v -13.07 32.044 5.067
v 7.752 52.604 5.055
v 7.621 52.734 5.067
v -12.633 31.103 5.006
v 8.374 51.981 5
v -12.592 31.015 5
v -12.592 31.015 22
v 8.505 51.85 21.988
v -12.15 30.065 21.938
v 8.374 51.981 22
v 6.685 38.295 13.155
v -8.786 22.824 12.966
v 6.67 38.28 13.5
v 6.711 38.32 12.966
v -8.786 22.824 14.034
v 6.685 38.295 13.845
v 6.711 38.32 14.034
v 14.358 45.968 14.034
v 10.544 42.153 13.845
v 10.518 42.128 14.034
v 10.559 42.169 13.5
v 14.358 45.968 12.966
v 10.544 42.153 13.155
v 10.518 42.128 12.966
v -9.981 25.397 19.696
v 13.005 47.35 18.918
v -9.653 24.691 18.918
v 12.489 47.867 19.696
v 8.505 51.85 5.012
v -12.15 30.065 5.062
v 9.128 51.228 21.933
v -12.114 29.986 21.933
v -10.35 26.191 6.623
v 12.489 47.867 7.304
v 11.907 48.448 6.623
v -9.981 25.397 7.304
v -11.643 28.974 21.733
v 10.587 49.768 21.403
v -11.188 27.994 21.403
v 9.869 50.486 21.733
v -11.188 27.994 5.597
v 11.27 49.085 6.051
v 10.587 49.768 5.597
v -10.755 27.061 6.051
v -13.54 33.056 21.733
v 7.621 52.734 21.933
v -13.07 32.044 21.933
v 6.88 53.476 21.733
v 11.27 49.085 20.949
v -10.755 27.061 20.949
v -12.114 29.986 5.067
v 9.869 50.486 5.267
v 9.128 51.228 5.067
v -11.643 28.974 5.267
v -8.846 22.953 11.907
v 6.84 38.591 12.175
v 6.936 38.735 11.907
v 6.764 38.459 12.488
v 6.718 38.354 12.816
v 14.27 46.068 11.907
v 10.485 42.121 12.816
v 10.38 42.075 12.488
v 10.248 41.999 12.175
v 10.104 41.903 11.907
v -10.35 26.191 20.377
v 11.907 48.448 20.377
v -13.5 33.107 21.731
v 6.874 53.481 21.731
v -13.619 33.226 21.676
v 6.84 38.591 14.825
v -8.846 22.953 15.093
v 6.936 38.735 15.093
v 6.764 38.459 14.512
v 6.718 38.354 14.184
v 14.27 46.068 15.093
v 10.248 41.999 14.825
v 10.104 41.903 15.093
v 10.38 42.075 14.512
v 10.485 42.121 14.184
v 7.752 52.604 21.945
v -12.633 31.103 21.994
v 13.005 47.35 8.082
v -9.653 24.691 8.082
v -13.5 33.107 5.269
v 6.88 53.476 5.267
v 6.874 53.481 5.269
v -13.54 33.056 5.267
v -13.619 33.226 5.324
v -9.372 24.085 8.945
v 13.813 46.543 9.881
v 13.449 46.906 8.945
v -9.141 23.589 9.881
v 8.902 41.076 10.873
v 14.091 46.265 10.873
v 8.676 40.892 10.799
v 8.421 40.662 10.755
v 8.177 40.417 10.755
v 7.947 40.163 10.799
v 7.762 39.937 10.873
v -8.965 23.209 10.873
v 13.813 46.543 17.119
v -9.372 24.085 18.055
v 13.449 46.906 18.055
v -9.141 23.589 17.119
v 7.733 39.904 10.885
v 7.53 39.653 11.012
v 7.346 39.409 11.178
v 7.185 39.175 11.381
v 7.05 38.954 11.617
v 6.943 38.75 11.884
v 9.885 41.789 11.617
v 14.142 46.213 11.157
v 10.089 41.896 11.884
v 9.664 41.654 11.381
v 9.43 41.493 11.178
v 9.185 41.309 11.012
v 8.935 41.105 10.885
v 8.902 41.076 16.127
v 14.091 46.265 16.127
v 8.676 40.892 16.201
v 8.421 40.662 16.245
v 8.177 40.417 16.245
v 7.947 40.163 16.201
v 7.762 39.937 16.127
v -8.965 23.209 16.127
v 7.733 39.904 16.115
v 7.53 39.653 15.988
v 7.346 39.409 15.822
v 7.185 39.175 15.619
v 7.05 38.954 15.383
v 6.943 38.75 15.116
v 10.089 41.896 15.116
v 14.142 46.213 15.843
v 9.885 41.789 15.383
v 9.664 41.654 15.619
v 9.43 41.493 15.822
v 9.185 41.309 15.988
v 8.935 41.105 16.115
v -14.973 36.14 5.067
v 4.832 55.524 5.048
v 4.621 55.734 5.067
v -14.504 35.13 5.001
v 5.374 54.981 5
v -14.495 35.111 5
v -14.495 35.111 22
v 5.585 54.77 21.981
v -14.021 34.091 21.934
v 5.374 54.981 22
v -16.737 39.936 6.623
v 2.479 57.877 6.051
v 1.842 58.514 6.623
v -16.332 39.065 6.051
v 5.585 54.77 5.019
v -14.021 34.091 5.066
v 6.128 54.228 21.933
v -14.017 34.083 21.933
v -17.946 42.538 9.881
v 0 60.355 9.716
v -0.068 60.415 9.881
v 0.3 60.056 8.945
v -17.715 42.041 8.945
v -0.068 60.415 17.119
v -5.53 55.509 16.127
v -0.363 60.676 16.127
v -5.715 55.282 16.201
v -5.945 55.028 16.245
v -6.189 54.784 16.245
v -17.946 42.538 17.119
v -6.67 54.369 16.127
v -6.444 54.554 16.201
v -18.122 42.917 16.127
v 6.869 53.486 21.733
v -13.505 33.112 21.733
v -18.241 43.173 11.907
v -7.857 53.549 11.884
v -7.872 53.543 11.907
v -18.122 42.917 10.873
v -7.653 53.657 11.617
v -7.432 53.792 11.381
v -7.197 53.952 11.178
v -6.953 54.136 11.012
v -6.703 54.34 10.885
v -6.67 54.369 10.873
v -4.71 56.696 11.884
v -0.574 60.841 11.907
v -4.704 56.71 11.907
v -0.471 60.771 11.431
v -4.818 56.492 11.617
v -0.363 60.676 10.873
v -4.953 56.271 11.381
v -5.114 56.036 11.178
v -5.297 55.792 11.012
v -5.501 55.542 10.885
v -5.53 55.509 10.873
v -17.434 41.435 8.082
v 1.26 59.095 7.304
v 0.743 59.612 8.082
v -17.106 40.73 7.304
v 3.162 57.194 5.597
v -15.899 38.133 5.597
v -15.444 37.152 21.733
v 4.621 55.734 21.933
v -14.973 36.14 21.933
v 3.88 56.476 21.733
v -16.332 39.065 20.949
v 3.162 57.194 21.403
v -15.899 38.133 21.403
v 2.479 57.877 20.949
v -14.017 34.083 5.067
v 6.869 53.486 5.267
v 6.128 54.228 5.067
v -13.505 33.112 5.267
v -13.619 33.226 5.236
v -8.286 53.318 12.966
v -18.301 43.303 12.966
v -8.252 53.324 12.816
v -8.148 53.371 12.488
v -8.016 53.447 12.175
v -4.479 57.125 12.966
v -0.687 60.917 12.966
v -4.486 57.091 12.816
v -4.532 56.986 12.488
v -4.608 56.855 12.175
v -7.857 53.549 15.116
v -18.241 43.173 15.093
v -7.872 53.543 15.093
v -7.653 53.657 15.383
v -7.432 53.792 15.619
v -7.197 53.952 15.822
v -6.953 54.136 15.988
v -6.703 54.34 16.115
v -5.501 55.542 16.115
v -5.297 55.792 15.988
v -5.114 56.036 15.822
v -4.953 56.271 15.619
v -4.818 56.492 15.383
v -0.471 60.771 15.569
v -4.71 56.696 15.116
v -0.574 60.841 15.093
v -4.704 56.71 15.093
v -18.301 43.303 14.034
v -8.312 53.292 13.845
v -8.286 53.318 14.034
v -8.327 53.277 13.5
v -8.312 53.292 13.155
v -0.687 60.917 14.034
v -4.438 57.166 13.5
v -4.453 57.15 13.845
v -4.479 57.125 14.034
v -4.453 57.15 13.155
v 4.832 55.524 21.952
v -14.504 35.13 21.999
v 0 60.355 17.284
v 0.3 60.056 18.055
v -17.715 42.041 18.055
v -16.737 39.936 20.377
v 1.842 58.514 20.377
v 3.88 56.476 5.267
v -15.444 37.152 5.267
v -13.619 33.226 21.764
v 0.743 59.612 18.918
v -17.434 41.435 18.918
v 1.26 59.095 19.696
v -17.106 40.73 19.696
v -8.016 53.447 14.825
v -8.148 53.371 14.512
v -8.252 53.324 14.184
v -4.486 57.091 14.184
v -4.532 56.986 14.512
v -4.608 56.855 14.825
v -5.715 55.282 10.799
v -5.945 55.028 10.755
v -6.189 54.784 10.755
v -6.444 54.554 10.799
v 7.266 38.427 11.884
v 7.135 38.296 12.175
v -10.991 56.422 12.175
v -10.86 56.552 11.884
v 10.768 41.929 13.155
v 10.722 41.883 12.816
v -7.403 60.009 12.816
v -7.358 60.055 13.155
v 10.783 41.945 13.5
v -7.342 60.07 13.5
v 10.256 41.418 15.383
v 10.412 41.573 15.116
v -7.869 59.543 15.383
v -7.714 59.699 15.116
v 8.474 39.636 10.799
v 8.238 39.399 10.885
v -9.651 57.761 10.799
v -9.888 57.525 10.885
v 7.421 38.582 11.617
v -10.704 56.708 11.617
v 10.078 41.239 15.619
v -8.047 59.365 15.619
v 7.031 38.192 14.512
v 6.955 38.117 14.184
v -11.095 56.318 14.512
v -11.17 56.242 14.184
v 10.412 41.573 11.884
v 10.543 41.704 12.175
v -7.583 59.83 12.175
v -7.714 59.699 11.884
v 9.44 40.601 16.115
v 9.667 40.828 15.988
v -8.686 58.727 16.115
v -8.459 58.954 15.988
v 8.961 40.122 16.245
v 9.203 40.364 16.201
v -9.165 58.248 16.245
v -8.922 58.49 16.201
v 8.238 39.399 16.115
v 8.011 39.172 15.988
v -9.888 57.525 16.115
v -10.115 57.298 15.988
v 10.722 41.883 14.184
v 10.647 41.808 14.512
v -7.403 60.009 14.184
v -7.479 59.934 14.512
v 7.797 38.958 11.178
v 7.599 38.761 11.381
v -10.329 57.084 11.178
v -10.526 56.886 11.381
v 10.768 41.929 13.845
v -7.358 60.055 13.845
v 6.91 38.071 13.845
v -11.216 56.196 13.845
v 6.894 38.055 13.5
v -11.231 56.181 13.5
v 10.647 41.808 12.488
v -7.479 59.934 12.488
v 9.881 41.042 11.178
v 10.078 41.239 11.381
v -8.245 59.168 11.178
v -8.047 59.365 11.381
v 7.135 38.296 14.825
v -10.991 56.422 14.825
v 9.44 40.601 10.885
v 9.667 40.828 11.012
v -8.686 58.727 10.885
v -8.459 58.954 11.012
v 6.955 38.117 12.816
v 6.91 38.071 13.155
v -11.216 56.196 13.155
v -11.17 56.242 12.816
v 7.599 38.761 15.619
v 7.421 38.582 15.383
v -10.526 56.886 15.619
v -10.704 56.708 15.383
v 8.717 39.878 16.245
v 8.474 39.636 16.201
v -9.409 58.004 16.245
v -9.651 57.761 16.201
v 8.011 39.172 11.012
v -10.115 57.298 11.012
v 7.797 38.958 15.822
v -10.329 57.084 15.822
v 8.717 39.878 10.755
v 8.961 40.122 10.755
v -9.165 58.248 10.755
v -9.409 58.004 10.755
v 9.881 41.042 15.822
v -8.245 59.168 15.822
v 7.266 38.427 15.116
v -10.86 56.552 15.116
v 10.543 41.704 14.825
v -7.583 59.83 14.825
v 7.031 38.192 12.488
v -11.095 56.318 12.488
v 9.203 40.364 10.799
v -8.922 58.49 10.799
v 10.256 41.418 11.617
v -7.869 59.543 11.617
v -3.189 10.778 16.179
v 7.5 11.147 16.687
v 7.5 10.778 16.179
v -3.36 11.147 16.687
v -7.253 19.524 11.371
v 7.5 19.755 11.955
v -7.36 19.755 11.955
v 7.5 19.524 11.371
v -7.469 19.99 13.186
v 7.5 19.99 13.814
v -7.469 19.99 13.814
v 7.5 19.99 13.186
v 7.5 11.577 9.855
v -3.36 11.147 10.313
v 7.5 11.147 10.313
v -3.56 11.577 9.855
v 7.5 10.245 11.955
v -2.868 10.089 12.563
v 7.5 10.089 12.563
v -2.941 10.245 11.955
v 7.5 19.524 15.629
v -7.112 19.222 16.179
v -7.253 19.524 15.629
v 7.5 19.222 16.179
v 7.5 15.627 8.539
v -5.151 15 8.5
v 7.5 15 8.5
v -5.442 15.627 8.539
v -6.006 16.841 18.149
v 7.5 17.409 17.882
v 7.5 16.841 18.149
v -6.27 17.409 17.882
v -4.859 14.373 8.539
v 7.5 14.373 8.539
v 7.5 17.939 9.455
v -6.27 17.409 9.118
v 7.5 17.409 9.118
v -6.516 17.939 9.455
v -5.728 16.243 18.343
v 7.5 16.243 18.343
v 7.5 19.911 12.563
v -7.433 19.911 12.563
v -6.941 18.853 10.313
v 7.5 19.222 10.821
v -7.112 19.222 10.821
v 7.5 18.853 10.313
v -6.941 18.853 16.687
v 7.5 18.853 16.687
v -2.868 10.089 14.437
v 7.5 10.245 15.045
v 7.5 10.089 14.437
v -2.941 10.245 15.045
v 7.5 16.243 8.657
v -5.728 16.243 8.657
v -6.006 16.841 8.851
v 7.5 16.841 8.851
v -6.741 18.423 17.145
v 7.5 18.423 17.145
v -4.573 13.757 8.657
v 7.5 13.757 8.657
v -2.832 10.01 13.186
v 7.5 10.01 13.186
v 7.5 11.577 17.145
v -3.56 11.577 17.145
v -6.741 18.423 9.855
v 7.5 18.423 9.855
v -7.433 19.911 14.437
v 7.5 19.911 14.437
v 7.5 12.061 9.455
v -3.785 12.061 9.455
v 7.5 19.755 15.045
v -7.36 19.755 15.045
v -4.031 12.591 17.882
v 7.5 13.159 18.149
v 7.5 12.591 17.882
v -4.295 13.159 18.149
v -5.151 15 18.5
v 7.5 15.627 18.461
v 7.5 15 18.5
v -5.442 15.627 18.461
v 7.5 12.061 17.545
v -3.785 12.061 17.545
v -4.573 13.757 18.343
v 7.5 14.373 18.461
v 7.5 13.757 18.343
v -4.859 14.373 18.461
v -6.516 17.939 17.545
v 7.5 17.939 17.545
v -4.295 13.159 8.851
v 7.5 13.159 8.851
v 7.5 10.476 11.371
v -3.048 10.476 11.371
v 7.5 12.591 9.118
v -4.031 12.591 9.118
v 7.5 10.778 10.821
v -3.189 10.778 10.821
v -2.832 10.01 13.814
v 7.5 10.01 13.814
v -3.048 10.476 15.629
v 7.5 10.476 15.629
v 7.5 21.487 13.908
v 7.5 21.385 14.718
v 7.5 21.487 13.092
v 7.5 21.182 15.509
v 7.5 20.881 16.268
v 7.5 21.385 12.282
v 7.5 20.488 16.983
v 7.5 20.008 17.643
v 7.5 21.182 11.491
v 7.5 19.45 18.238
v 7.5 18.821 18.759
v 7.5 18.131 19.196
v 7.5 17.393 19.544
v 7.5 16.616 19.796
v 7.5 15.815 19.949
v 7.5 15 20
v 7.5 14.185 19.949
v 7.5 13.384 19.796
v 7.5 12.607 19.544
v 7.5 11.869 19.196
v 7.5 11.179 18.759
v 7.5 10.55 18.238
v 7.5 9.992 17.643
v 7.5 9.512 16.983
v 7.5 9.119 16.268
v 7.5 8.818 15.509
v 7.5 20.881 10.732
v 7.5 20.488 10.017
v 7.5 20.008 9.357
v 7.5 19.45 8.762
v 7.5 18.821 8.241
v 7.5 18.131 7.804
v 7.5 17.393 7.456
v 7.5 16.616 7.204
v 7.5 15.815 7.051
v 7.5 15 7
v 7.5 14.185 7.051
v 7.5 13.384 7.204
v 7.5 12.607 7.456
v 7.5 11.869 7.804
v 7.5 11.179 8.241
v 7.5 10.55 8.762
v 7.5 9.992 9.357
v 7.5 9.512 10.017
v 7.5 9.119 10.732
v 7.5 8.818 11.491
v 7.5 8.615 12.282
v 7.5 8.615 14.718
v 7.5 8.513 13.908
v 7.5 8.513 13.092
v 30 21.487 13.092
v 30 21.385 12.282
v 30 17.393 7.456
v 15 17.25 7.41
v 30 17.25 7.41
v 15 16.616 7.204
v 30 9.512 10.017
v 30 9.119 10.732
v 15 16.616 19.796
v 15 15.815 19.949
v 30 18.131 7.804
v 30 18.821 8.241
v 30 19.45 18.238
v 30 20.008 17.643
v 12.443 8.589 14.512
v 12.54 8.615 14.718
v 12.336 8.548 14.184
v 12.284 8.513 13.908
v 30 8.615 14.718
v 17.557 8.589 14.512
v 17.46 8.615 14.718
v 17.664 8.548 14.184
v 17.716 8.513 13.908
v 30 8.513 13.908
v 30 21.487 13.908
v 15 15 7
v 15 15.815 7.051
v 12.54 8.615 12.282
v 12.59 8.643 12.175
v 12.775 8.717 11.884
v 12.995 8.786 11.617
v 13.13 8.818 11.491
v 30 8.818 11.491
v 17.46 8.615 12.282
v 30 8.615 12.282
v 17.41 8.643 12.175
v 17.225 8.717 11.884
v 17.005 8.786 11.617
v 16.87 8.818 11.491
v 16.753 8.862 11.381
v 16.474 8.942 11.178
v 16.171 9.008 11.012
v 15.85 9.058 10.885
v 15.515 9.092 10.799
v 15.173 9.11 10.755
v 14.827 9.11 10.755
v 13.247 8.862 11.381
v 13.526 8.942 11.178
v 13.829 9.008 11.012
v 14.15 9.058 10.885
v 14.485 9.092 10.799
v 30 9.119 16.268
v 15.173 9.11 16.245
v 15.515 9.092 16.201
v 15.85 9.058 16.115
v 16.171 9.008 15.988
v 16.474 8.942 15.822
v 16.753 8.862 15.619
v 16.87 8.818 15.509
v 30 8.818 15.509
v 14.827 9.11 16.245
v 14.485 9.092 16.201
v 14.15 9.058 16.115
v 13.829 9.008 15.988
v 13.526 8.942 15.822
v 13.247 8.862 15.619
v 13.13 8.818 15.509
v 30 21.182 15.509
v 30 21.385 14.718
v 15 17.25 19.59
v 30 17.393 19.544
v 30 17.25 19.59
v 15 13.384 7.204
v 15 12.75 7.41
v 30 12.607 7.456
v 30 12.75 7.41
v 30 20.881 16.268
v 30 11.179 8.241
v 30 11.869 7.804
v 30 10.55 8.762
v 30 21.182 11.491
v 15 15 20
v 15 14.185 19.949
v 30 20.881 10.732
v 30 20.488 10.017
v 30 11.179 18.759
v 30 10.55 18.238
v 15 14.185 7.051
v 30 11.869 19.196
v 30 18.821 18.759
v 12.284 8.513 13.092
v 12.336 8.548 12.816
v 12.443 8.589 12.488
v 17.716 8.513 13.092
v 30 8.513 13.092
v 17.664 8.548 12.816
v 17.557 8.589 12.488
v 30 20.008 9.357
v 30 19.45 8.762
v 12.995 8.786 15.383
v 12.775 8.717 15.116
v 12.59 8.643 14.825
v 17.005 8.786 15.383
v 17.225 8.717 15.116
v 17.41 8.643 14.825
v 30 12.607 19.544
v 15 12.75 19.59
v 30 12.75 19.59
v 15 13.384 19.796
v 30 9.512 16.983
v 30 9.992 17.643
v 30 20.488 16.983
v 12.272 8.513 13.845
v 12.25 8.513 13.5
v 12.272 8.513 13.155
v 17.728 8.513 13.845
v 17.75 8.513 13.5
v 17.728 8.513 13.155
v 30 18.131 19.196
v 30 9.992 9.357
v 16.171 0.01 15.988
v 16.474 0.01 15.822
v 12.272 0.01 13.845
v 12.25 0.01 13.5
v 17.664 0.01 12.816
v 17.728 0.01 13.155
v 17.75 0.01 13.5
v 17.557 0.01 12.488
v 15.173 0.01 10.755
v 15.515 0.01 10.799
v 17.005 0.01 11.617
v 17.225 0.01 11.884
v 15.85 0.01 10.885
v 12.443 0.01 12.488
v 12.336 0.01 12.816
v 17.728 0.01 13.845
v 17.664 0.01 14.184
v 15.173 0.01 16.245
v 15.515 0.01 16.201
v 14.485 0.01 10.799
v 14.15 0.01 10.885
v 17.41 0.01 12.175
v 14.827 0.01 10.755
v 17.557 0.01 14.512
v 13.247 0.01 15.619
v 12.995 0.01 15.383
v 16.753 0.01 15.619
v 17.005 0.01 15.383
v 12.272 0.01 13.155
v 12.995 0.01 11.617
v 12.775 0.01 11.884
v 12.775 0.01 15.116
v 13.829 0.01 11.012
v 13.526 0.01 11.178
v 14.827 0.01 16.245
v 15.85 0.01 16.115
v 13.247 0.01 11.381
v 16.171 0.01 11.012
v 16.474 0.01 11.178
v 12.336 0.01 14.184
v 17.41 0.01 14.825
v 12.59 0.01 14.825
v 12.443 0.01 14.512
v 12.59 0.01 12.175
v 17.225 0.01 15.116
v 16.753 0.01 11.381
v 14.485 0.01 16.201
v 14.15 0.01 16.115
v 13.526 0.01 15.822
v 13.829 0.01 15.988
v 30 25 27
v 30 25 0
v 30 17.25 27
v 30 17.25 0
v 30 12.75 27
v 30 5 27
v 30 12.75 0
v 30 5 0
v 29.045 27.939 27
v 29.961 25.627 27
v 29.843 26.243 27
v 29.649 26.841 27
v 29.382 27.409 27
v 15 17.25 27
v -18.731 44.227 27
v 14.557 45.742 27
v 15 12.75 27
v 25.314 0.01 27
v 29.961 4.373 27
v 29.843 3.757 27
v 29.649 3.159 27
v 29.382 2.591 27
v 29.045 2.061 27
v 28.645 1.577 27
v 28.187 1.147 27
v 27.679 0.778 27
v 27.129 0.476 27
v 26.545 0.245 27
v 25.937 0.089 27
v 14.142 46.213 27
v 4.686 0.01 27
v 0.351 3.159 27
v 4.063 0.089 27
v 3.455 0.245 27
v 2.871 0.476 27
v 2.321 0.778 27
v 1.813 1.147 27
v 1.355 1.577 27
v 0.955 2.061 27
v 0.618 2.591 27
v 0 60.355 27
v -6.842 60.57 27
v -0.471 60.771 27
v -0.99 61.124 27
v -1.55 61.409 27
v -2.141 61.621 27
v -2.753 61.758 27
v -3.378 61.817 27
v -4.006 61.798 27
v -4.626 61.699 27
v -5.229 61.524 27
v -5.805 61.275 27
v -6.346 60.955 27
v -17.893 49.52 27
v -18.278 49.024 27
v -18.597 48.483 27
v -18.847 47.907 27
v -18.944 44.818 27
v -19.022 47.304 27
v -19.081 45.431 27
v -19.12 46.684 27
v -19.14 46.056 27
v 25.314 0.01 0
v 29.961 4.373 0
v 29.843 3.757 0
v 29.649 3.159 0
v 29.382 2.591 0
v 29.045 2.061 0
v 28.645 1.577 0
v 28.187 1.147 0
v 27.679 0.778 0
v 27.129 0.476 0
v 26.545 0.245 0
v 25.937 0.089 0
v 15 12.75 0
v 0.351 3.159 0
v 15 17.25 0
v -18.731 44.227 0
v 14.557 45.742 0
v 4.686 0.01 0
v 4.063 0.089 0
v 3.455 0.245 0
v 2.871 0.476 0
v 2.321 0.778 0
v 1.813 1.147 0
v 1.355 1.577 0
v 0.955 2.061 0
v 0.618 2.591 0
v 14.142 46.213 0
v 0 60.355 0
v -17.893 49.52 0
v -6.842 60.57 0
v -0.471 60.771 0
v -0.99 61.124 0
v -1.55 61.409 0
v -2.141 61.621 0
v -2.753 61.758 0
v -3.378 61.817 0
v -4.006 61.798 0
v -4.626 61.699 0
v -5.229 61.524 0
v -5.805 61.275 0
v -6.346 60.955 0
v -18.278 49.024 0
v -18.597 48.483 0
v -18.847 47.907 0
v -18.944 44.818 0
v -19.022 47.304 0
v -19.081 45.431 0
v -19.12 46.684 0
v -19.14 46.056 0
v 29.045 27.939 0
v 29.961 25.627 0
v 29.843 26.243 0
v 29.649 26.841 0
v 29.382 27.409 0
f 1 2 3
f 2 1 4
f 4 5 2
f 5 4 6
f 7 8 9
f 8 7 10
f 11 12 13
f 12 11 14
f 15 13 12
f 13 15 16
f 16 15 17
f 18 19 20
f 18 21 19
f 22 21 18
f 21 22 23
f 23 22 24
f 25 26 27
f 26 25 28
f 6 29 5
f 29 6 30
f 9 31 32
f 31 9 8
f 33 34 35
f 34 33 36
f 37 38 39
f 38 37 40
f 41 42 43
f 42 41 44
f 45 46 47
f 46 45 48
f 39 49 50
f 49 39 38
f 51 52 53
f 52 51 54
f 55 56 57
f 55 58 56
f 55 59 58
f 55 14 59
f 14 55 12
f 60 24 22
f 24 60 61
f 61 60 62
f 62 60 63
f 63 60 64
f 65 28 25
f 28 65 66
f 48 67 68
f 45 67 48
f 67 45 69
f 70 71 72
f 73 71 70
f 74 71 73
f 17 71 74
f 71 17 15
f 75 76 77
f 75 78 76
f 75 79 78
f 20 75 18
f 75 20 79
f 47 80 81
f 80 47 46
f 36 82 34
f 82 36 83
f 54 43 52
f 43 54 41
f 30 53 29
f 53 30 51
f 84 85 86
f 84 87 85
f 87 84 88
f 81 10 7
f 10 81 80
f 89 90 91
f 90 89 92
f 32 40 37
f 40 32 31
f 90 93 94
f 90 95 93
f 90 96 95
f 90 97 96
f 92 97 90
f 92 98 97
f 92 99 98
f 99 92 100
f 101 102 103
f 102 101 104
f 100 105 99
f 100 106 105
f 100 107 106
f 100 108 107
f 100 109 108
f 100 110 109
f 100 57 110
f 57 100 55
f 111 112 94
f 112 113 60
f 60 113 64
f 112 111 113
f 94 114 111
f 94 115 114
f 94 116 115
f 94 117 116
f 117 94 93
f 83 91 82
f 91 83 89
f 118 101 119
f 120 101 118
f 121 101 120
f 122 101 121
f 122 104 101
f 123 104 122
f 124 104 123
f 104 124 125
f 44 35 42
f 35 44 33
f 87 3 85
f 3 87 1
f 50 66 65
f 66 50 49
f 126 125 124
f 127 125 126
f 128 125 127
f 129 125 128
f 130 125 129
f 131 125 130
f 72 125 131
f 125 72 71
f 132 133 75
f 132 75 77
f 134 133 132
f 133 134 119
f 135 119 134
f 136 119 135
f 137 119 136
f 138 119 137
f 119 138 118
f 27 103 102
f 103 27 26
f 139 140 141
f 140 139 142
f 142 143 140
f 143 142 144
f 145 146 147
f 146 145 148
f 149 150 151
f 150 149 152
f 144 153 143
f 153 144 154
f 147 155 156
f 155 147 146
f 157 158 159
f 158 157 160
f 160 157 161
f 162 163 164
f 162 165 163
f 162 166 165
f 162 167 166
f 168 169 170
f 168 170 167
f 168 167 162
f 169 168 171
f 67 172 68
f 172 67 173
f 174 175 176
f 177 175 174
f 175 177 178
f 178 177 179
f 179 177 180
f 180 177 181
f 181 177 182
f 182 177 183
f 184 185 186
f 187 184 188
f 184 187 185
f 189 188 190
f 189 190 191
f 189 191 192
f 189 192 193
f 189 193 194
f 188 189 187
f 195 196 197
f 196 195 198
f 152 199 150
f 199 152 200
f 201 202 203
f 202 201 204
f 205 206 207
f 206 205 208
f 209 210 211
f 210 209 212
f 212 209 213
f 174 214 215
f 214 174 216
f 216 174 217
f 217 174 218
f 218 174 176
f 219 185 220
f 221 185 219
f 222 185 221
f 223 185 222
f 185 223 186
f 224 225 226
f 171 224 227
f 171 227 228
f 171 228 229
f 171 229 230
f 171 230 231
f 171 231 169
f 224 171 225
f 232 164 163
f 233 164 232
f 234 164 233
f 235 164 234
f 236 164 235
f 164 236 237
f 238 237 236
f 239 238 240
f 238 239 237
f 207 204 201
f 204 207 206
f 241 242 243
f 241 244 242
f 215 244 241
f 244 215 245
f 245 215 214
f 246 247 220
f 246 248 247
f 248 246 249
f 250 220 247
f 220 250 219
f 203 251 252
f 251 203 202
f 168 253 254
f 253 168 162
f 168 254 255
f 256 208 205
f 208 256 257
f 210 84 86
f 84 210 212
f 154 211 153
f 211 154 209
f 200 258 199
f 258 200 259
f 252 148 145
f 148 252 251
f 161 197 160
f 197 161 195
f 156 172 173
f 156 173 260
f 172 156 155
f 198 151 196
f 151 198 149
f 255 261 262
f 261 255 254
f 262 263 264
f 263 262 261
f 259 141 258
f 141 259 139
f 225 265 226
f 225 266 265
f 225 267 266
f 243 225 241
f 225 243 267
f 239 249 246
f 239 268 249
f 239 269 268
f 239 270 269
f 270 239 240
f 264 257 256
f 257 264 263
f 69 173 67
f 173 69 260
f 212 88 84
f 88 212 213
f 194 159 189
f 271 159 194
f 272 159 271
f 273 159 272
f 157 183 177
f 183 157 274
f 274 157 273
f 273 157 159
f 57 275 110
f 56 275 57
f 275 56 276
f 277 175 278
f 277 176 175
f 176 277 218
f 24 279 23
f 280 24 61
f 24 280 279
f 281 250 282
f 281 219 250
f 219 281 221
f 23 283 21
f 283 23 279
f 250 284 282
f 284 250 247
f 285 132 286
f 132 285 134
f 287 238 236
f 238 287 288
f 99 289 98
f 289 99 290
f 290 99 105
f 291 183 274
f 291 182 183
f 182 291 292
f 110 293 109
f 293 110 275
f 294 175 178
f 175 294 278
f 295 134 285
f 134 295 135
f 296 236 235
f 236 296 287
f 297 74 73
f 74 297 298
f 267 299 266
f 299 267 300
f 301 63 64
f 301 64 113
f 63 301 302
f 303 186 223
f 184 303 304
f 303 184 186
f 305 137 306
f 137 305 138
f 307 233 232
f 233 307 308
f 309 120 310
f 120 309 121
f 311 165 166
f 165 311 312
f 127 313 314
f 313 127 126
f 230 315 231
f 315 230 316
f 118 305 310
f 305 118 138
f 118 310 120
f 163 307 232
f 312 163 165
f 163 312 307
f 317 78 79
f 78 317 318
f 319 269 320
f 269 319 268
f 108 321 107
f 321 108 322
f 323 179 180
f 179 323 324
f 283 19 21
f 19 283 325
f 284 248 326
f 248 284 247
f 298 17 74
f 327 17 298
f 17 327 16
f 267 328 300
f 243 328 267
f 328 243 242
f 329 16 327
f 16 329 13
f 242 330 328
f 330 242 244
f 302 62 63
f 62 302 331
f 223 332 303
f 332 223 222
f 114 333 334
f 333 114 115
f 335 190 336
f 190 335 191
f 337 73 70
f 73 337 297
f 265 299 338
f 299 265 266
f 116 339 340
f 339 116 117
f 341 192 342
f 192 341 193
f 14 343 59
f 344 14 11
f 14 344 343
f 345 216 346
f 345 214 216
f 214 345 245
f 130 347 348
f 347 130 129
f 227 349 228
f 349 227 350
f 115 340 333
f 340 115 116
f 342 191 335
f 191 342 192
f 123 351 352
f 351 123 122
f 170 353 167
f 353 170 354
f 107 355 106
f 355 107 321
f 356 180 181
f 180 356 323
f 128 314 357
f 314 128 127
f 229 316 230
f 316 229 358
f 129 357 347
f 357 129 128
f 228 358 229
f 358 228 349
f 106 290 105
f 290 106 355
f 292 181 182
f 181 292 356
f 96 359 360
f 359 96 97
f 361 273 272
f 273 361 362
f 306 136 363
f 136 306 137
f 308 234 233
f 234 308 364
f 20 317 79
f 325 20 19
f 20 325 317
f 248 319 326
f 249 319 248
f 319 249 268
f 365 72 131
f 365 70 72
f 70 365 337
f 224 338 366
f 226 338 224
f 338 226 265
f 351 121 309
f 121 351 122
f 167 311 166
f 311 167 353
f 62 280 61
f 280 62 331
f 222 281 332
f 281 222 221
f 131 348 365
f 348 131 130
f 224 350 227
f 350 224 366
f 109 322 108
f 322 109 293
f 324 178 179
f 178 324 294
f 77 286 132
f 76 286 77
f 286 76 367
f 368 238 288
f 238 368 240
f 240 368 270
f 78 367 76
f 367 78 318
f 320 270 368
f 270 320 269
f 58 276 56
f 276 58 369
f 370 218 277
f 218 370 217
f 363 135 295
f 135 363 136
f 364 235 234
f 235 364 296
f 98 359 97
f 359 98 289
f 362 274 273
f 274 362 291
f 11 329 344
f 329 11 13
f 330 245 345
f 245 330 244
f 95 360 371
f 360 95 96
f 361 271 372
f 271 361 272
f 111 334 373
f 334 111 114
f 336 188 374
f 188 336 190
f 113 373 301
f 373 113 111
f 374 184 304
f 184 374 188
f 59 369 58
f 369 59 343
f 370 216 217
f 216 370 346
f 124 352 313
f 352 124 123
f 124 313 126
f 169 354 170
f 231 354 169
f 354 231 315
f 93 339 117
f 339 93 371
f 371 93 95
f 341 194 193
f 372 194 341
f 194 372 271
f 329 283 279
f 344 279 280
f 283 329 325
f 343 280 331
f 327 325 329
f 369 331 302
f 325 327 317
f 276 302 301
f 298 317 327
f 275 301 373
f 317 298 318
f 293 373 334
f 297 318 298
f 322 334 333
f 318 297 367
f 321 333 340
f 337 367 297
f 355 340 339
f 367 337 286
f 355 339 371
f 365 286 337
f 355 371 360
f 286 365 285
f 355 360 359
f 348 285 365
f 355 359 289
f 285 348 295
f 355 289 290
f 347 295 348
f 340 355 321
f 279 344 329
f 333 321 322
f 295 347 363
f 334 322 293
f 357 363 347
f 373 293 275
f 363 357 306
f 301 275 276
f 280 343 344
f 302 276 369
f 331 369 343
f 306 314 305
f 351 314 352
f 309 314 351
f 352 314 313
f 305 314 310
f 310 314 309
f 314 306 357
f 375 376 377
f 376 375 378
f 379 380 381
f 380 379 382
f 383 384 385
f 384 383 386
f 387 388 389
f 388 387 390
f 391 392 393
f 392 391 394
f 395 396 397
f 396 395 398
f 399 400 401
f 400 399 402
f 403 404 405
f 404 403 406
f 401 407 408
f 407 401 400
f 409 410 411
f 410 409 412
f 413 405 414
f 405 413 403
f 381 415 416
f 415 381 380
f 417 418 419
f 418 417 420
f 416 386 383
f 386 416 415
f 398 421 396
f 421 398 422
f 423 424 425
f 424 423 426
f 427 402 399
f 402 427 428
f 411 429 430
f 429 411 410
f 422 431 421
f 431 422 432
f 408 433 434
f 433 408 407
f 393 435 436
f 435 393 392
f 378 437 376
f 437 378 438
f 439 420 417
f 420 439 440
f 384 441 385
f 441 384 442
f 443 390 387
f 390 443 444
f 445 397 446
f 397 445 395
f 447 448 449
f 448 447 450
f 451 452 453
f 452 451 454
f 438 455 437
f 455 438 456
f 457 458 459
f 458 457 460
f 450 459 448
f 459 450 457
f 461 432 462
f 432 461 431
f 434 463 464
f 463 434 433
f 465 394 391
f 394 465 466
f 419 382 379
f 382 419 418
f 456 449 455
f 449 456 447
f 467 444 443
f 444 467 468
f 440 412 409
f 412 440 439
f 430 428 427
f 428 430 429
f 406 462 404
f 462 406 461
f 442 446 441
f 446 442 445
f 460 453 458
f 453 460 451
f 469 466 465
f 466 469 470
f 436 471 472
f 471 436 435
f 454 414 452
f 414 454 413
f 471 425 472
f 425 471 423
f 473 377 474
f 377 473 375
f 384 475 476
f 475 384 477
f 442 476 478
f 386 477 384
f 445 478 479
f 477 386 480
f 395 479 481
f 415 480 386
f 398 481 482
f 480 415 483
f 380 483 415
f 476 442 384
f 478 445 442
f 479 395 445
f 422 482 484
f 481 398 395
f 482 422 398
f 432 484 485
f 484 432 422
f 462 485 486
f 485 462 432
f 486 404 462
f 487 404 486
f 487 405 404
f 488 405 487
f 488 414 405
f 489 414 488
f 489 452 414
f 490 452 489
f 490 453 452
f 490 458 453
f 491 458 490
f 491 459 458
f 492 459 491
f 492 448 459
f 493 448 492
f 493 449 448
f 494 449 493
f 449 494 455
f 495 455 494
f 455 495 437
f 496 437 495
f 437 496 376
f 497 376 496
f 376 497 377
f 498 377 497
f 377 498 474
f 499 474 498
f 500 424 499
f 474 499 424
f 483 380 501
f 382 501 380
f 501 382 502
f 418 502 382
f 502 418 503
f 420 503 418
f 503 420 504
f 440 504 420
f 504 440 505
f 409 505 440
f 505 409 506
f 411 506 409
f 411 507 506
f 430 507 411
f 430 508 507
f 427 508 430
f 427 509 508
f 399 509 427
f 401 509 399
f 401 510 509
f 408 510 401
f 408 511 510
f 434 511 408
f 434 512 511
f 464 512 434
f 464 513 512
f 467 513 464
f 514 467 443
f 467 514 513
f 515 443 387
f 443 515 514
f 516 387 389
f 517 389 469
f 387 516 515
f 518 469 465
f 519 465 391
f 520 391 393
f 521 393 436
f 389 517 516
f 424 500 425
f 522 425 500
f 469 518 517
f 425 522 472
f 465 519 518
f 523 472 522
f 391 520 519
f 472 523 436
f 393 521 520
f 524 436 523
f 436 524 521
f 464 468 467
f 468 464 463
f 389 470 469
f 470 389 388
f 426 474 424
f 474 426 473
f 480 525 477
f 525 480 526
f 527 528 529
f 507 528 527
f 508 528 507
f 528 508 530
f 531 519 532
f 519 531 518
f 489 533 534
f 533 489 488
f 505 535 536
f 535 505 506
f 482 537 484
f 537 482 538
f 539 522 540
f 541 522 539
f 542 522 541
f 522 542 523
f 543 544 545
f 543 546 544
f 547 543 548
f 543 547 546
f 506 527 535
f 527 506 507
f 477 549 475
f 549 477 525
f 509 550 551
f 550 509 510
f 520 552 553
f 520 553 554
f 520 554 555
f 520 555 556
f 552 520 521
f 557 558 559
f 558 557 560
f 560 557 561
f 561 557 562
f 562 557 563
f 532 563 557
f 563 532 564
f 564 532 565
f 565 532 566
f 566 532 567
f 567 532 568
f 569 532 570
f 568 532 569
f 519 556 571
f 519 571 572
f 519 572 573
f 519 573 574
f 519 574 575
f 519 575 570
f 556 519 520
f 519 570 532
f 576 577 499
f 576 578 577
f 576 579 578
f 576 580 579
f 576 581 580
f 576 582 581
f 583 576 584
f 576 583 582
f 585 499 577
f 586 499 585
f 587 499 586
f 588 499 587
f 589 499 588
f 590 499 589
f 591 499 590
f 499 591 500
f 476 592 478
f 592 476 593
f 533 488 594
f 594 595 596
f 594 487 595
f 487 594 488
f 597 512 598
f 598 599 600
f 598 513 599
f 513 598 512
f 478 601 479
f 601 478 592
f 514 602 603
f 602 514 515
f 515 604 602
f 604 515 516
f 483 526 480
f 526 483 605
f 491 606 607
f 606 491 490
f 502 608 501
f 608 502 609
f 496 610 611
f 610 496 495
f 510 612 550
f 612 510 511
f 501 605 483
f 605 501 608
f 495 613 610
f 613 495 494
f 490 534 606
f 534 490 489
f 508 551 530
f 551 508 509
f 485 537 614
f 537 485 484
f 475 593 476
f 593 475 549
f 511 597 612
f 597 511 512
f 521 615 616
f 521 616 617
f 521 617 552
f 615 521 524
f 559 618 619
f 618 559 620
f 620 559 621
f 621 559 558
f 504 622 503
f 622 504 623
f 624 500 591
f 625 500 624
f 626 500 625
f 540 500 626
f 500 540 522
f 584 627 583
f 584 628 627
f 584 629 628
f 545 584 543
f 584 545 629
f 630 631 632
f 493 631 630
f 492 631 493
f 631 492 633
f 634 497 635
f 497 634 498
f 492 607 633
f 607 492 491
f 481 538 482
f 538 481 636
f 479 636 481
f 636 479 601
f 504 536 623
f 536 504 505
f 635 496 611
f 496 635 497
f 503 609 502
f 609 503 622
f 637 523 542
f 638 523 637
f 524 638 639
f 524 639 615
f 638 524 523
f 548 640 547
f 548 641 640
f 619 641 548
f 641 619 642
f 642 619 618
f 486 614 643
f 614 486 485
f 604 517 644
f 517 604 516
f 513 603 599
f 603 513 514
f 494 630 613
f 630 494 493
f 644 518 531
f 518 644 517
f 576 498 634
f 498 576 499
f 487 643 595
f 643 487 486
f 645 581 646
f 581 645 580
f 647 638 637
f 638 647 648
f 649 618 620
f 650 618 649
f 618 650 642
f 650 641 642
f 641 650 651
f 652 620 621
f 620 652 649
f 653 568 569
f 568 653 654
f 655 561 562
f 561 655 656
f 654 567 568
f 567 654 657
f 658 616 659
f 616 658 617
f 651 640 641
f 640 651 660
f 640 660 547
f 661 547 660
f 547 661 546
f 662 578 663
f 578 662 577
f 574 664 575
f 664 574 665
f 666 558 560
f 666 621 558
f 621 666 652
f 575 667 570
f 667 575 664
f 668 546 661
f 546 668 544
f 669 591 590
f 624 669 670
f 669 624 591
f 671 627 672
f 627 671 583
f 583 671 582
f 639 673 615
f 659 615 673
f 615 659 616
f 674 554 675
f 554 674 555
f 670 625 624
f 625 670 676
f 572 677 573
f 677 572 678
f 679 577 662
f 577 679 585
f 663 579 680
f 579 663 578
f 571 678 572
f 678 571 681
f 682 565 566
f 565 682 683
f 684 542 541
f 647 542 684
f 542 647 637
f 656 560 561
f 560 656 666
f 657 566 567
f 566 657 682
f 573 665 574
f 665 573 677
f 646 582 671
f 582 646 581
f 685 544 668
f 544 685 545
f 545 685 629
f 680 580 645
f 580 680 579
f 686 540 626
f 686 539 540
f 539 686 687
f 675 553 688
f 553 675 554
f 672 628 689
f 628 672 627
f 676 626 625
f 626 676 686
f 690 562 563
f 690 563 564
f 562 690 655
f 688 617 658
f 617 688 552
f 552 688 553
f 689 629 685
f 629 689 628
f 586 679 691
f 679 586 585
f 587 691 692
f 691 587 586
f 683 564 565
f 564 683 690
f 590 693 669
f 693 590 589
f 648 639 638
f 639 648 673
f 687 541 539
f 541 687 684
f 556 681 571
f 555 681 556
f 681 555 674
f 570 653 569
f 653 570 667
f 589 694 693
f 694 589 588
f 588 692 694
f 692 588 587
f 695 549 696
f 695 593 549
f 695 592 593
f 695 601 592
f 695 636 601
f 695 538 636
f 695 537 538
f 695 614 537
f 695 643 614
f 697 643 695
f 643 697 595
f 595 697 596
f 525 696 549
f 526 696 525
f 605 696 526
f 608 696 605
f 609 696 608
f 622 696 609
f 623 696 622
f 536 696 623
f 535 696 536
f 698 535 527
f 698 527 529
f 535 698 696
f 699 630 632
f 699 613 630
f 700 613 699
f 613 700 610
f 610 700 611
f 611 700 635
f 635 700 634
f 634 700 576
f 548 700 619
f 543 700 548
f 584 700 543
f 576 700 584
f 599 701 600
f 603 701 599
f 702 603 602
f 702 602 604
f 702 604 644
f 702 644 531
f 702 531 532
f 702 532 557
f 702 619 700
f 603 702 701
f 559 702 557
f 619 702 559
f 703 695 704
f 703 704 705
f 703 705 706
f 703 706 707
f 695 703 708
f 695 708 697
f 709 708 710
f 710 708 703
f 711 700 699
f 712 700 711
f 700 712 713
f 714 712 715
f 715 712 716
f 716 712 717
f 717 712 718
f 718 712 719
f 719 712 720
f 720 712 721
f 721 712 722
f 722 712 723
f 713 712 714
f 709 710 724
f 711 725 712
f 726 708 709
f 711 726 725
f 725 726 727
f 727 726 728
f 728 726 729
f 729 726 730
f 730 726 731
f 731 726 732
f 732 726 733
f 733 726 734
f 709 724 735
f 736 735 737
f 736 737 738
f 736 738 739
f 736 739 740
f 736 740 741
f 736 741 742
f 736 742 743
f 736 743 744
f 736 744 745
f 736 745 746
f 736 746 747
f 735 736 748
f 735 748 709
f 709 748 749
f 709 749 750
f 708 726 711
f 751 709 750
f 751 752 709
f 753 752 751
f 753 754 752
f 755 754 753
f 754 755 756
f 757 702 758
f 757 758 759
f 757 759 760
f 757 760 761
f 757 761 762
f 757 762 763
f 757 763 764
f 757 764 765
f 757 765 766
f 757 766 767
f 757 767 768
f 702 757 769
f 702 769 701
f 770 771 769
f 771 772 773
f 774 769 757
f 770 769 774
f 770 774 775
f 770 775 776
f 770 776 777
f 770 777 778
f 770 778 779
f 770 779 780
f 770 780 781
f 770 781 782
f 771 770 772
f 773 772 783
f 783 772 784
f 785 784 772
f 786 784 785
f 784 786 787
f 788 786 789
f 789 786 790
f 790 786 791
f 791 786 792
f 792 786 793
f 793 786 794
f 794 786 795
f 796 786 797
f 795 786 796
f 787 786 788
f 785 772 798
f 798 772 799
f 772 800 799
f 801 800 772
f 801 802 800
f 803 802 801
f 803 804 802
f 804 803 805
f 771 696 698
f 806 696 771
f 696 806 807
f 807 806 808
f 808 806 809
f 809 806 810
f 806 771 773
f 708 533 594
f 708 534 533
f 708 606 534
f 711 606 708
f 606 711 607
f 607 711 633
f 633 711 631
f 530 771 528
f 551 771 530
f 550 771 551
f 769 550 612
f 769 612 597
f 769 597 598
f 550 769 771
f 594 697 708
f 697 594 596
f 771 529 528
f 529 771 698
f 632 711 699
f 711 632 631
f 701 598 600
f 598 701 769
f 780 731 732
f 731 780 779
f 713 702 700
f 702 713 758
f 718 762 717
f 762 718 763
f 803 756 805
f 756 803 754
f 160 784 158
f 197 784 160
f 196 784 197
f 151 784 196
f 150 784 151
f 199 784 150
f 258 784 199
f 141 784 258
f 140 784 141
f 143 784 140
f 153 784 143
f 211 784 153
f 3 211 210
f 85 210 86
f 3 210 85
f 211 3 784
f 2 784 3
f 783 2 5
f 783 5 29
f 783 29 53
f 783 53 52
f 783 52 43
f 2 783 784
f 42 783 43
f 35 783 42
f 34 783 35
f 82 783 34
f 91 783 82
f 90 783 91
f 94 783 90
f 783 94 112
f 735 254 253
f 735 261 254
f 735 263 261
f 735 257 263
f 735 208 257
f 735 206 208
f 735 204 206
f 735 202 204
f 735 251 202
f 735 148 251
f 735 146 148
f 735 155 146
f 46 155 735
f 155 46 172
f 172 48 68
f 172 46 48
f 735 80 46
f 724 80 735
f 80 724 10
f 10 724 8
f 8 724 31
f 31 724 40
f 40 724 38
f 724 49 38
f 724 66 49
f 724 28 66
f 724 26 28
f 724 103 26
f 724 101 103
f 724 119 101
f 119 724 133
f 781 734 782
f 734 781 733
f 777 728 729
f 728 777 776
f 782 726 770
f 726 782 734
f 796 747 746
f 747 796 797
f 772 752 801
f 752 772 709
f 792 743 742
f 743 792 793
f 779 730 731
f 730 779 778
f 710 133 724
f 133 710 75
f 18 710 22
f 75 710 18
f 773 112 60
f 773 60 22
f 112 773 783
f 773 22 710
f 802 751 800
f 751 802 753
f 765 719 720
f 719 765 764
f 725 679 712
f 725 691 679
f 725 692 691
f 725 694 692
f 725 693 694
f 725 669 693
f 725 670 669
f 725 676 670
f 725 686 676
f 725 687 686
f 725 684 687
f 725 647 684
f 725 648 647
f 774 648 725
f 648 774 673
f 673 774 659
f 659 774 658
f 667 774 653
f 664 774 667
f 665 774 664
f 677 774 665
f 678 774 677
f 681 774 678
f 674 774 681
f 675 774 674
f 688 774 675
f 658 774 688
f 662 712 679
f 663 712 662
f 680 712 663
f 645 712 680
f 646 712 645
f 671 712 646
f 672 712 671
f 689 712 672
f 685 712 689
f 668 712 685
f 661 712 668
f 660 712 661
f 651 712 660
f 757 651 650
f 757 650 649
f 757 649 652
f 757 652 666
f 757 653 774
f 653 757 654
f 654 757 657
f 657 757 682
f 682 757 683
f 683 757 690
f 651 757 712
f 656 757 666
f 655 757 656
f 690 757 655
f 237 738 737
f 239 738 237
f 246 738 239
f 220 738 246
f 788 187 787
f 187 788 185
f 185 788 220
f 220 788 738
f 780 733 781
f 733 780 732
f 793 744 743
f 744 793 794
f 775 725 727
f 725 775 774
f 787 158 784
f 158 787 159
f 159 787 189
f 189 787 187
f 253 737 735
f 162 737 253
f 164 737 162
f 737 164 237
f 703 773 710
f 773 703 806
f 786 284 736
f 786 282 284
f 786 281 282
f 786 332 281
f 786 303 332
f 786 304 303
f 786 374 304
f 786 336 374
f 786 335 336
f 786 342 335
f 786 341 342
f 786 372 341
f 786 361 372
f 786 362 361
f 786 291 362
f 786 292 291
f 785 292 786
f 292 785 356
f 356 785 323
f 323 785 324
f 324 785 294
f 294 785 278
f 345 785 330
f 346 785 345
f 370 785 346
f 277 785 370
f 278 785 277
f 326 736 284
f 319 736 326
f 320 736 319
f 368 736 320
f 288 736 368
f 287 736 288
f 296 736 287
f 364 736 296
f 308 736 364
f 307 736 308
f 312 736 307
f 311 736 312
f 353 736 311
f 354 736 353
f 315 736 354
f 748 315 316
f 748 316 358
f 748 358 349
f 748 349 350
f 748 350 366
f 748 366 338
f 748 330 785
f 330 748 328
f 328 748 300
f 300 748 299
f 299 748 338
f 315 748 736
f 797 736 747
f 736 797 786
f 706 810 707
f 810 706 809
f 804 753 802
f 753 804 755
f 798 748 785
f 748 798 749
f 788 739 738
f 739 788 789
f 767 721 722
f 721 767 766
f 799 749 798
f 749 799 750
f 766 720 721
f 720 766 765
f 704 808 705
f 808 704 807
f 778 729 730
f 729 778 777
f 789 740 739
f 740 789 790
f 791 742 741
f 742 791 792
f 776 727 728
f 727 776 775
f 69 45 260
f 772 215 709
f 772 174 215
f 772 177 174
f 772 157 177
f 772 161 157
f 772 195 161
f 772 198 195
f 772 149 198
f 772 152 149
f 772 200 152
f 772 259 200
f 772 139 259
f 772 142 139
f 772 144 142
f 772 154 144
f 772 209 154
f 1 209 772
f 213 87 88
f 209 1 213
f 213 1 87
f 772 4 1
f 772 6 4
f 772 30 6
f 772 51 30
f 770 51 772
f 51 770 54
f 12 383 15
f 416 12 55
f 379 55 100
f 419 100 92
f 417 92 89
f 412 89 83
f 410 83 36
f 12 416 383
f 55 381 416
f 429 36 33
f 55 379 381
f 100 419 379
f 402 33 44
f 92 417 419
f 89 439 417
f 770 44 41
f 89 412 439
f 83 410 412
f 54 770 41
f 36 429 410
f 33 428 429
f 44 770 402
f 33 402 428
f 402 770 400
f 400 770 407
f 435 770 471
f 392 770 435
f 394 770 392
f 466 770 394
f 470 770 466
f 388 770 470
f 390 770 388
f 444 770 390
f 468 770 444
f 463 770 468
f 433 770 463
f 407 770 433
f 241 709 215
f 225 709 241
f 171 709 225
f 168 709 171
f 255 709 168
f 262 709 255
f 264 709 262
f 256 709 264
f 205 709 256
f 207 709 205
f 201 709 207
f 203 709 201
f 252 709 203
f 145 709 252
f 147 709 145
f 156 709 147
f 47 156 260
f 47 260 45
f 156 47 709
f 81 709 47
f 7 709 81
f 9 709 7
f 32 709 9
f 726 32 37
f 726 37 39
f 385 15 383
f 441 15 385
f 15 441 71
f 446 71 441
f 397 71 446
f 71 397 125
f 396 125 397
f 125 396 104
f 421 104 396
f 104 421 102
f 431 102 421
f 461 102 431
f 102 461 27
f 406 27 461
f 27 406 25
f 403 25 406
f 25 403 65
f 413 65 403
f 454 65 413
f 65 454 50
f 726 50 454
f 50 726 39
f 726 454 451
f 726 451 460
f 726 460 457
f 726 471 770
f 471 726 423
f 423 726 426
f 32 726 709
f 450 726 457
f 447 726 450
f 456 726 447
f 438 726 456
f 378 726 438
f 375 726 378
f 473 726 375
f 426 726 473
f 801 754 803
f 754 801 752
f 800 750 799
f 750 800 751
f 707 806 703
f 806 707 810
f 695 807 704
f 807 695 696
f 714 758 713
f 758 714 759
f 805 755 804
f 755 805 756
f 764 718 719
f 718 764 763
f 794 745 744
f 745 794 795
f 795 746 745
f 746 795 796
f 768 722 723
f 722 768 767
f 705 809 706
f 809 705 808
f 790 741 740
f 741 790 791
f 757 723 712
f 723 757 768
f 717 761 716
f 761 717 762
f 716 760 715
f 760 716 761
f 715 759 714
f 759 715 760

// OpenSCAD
set_screw_dia=5.5;
radius=5;
$fn=50;

sharpie_hole_dia=17; //sized for Sharpie fine tip on small end
sharpie_hole_length=23; //sized for Sharpie chisel tip on lg end
sharpie_hole_depth=26;
sharpie_cube_width=25;
sharpie_cube_length=30;
sharpie_cube_height=27;
sharpie_points=[[radius,radius,0],[sharpie_cube_width-radius,radius,0],[radius,sharpie_cube_length-radius],[sharpie_cube_width-radius,sharpie_cube_length-radius,0]];


blowgun_hole_dia_lg=13;
blowgun_hole_dia_sm=10;
blowgun_hole_depth=33;
blowgun_cube_width=30;
blowgun_cube_length=30;
blowgun_cube_height=27;
blowgun_notch_width=4.5;
blowgun_points=[[radius,radius,0],[blowgun_cube_width-radius,radius,0],[radius,blowgun_cube_length-radius],[blowgun_cube_width-radius,blowgun_cube_length-radius,0]];

sharpie_blowgun_angle=45;

difference(){
solid_part();
holes();
}

module solid_part(){
hull(){
//sharpie cube
translate([0,blowgun_cube_length-radius,0])
rotate([0,0,sharpie_blowgun_angle])
hull(){
for (a=[0:3])
translate(sharpie_points[a])
cylinder(r=radius,h=sharpie_cube_height);
}

//blowgun cube
hull(){
for (a=[0:3])
translate(blowgun_points[a])
cylinder(r=radius,h=blowgun_cube_height);
}
}
}

module holes(){
//sharpie holes
translate([-15,blowgun_cube_length-radius+cos(sharpie_blowgun_angle)*sharpie_cube_length/2-radius-2,sharpie_cube_height/2])
rotate([0,90,sharpie_blowgun_angle])
cylinder(d=sharpie_hole_dia,h=sharpie_cube_width+15);
translate([-15,blowgun_cube_length-radius+cos(sharpie_blowgun_angle)*sharpie_cube_length/2-radius-2+(sharpie_hole_length-sharpie_hole_dia),sharpie_cube_height/2])
rotate([0,90,sharpie_blowgun_angle])
cylinder(d=sharpie_hole_dia,h=sharpie_cube_width+15);

translate([sin(sharpie_blowgun_angle)*sharpie_cube_width/2,blowgun_cube_length-radius+15,sharpie_cube_height/2])
rotate([-90,0,sharpie_blowgun_angle])
cylinder(d=set_screw_dia,h=sharpie_cube_width/2+20);


//blowgun hole
translate([-10,blowgun_cube_length/2,blowgun_cube_height/2])
rotate([0,90,0])
cylinder(d=blowgun_hole_dia_sm,h=blowgun_cube_width/4+10);
translate([blowgun_cube_width/4,blowgun_cube_length/2,blowgun_cube_height/2])
rotate([0,90,0])
cylinder(d=blowgun_hole_dia_lg,h=blowgun_cube_width/2+10);

translate([blowgun_cube_width/2,-10,blowgun_cube_height/2])
rotate([-90,0,0])
cylinder(d=set_screw_dia,h=blowgun_cube_length/2+10);

//blowgun notch
translate([blowgun_cube_width/2,blowgun_cube_width/2-blowgun_notch_width/2,0])
cube([blowgun_cube_width/2,blowgun_notch_width,blowgun_cube_height]);
}
